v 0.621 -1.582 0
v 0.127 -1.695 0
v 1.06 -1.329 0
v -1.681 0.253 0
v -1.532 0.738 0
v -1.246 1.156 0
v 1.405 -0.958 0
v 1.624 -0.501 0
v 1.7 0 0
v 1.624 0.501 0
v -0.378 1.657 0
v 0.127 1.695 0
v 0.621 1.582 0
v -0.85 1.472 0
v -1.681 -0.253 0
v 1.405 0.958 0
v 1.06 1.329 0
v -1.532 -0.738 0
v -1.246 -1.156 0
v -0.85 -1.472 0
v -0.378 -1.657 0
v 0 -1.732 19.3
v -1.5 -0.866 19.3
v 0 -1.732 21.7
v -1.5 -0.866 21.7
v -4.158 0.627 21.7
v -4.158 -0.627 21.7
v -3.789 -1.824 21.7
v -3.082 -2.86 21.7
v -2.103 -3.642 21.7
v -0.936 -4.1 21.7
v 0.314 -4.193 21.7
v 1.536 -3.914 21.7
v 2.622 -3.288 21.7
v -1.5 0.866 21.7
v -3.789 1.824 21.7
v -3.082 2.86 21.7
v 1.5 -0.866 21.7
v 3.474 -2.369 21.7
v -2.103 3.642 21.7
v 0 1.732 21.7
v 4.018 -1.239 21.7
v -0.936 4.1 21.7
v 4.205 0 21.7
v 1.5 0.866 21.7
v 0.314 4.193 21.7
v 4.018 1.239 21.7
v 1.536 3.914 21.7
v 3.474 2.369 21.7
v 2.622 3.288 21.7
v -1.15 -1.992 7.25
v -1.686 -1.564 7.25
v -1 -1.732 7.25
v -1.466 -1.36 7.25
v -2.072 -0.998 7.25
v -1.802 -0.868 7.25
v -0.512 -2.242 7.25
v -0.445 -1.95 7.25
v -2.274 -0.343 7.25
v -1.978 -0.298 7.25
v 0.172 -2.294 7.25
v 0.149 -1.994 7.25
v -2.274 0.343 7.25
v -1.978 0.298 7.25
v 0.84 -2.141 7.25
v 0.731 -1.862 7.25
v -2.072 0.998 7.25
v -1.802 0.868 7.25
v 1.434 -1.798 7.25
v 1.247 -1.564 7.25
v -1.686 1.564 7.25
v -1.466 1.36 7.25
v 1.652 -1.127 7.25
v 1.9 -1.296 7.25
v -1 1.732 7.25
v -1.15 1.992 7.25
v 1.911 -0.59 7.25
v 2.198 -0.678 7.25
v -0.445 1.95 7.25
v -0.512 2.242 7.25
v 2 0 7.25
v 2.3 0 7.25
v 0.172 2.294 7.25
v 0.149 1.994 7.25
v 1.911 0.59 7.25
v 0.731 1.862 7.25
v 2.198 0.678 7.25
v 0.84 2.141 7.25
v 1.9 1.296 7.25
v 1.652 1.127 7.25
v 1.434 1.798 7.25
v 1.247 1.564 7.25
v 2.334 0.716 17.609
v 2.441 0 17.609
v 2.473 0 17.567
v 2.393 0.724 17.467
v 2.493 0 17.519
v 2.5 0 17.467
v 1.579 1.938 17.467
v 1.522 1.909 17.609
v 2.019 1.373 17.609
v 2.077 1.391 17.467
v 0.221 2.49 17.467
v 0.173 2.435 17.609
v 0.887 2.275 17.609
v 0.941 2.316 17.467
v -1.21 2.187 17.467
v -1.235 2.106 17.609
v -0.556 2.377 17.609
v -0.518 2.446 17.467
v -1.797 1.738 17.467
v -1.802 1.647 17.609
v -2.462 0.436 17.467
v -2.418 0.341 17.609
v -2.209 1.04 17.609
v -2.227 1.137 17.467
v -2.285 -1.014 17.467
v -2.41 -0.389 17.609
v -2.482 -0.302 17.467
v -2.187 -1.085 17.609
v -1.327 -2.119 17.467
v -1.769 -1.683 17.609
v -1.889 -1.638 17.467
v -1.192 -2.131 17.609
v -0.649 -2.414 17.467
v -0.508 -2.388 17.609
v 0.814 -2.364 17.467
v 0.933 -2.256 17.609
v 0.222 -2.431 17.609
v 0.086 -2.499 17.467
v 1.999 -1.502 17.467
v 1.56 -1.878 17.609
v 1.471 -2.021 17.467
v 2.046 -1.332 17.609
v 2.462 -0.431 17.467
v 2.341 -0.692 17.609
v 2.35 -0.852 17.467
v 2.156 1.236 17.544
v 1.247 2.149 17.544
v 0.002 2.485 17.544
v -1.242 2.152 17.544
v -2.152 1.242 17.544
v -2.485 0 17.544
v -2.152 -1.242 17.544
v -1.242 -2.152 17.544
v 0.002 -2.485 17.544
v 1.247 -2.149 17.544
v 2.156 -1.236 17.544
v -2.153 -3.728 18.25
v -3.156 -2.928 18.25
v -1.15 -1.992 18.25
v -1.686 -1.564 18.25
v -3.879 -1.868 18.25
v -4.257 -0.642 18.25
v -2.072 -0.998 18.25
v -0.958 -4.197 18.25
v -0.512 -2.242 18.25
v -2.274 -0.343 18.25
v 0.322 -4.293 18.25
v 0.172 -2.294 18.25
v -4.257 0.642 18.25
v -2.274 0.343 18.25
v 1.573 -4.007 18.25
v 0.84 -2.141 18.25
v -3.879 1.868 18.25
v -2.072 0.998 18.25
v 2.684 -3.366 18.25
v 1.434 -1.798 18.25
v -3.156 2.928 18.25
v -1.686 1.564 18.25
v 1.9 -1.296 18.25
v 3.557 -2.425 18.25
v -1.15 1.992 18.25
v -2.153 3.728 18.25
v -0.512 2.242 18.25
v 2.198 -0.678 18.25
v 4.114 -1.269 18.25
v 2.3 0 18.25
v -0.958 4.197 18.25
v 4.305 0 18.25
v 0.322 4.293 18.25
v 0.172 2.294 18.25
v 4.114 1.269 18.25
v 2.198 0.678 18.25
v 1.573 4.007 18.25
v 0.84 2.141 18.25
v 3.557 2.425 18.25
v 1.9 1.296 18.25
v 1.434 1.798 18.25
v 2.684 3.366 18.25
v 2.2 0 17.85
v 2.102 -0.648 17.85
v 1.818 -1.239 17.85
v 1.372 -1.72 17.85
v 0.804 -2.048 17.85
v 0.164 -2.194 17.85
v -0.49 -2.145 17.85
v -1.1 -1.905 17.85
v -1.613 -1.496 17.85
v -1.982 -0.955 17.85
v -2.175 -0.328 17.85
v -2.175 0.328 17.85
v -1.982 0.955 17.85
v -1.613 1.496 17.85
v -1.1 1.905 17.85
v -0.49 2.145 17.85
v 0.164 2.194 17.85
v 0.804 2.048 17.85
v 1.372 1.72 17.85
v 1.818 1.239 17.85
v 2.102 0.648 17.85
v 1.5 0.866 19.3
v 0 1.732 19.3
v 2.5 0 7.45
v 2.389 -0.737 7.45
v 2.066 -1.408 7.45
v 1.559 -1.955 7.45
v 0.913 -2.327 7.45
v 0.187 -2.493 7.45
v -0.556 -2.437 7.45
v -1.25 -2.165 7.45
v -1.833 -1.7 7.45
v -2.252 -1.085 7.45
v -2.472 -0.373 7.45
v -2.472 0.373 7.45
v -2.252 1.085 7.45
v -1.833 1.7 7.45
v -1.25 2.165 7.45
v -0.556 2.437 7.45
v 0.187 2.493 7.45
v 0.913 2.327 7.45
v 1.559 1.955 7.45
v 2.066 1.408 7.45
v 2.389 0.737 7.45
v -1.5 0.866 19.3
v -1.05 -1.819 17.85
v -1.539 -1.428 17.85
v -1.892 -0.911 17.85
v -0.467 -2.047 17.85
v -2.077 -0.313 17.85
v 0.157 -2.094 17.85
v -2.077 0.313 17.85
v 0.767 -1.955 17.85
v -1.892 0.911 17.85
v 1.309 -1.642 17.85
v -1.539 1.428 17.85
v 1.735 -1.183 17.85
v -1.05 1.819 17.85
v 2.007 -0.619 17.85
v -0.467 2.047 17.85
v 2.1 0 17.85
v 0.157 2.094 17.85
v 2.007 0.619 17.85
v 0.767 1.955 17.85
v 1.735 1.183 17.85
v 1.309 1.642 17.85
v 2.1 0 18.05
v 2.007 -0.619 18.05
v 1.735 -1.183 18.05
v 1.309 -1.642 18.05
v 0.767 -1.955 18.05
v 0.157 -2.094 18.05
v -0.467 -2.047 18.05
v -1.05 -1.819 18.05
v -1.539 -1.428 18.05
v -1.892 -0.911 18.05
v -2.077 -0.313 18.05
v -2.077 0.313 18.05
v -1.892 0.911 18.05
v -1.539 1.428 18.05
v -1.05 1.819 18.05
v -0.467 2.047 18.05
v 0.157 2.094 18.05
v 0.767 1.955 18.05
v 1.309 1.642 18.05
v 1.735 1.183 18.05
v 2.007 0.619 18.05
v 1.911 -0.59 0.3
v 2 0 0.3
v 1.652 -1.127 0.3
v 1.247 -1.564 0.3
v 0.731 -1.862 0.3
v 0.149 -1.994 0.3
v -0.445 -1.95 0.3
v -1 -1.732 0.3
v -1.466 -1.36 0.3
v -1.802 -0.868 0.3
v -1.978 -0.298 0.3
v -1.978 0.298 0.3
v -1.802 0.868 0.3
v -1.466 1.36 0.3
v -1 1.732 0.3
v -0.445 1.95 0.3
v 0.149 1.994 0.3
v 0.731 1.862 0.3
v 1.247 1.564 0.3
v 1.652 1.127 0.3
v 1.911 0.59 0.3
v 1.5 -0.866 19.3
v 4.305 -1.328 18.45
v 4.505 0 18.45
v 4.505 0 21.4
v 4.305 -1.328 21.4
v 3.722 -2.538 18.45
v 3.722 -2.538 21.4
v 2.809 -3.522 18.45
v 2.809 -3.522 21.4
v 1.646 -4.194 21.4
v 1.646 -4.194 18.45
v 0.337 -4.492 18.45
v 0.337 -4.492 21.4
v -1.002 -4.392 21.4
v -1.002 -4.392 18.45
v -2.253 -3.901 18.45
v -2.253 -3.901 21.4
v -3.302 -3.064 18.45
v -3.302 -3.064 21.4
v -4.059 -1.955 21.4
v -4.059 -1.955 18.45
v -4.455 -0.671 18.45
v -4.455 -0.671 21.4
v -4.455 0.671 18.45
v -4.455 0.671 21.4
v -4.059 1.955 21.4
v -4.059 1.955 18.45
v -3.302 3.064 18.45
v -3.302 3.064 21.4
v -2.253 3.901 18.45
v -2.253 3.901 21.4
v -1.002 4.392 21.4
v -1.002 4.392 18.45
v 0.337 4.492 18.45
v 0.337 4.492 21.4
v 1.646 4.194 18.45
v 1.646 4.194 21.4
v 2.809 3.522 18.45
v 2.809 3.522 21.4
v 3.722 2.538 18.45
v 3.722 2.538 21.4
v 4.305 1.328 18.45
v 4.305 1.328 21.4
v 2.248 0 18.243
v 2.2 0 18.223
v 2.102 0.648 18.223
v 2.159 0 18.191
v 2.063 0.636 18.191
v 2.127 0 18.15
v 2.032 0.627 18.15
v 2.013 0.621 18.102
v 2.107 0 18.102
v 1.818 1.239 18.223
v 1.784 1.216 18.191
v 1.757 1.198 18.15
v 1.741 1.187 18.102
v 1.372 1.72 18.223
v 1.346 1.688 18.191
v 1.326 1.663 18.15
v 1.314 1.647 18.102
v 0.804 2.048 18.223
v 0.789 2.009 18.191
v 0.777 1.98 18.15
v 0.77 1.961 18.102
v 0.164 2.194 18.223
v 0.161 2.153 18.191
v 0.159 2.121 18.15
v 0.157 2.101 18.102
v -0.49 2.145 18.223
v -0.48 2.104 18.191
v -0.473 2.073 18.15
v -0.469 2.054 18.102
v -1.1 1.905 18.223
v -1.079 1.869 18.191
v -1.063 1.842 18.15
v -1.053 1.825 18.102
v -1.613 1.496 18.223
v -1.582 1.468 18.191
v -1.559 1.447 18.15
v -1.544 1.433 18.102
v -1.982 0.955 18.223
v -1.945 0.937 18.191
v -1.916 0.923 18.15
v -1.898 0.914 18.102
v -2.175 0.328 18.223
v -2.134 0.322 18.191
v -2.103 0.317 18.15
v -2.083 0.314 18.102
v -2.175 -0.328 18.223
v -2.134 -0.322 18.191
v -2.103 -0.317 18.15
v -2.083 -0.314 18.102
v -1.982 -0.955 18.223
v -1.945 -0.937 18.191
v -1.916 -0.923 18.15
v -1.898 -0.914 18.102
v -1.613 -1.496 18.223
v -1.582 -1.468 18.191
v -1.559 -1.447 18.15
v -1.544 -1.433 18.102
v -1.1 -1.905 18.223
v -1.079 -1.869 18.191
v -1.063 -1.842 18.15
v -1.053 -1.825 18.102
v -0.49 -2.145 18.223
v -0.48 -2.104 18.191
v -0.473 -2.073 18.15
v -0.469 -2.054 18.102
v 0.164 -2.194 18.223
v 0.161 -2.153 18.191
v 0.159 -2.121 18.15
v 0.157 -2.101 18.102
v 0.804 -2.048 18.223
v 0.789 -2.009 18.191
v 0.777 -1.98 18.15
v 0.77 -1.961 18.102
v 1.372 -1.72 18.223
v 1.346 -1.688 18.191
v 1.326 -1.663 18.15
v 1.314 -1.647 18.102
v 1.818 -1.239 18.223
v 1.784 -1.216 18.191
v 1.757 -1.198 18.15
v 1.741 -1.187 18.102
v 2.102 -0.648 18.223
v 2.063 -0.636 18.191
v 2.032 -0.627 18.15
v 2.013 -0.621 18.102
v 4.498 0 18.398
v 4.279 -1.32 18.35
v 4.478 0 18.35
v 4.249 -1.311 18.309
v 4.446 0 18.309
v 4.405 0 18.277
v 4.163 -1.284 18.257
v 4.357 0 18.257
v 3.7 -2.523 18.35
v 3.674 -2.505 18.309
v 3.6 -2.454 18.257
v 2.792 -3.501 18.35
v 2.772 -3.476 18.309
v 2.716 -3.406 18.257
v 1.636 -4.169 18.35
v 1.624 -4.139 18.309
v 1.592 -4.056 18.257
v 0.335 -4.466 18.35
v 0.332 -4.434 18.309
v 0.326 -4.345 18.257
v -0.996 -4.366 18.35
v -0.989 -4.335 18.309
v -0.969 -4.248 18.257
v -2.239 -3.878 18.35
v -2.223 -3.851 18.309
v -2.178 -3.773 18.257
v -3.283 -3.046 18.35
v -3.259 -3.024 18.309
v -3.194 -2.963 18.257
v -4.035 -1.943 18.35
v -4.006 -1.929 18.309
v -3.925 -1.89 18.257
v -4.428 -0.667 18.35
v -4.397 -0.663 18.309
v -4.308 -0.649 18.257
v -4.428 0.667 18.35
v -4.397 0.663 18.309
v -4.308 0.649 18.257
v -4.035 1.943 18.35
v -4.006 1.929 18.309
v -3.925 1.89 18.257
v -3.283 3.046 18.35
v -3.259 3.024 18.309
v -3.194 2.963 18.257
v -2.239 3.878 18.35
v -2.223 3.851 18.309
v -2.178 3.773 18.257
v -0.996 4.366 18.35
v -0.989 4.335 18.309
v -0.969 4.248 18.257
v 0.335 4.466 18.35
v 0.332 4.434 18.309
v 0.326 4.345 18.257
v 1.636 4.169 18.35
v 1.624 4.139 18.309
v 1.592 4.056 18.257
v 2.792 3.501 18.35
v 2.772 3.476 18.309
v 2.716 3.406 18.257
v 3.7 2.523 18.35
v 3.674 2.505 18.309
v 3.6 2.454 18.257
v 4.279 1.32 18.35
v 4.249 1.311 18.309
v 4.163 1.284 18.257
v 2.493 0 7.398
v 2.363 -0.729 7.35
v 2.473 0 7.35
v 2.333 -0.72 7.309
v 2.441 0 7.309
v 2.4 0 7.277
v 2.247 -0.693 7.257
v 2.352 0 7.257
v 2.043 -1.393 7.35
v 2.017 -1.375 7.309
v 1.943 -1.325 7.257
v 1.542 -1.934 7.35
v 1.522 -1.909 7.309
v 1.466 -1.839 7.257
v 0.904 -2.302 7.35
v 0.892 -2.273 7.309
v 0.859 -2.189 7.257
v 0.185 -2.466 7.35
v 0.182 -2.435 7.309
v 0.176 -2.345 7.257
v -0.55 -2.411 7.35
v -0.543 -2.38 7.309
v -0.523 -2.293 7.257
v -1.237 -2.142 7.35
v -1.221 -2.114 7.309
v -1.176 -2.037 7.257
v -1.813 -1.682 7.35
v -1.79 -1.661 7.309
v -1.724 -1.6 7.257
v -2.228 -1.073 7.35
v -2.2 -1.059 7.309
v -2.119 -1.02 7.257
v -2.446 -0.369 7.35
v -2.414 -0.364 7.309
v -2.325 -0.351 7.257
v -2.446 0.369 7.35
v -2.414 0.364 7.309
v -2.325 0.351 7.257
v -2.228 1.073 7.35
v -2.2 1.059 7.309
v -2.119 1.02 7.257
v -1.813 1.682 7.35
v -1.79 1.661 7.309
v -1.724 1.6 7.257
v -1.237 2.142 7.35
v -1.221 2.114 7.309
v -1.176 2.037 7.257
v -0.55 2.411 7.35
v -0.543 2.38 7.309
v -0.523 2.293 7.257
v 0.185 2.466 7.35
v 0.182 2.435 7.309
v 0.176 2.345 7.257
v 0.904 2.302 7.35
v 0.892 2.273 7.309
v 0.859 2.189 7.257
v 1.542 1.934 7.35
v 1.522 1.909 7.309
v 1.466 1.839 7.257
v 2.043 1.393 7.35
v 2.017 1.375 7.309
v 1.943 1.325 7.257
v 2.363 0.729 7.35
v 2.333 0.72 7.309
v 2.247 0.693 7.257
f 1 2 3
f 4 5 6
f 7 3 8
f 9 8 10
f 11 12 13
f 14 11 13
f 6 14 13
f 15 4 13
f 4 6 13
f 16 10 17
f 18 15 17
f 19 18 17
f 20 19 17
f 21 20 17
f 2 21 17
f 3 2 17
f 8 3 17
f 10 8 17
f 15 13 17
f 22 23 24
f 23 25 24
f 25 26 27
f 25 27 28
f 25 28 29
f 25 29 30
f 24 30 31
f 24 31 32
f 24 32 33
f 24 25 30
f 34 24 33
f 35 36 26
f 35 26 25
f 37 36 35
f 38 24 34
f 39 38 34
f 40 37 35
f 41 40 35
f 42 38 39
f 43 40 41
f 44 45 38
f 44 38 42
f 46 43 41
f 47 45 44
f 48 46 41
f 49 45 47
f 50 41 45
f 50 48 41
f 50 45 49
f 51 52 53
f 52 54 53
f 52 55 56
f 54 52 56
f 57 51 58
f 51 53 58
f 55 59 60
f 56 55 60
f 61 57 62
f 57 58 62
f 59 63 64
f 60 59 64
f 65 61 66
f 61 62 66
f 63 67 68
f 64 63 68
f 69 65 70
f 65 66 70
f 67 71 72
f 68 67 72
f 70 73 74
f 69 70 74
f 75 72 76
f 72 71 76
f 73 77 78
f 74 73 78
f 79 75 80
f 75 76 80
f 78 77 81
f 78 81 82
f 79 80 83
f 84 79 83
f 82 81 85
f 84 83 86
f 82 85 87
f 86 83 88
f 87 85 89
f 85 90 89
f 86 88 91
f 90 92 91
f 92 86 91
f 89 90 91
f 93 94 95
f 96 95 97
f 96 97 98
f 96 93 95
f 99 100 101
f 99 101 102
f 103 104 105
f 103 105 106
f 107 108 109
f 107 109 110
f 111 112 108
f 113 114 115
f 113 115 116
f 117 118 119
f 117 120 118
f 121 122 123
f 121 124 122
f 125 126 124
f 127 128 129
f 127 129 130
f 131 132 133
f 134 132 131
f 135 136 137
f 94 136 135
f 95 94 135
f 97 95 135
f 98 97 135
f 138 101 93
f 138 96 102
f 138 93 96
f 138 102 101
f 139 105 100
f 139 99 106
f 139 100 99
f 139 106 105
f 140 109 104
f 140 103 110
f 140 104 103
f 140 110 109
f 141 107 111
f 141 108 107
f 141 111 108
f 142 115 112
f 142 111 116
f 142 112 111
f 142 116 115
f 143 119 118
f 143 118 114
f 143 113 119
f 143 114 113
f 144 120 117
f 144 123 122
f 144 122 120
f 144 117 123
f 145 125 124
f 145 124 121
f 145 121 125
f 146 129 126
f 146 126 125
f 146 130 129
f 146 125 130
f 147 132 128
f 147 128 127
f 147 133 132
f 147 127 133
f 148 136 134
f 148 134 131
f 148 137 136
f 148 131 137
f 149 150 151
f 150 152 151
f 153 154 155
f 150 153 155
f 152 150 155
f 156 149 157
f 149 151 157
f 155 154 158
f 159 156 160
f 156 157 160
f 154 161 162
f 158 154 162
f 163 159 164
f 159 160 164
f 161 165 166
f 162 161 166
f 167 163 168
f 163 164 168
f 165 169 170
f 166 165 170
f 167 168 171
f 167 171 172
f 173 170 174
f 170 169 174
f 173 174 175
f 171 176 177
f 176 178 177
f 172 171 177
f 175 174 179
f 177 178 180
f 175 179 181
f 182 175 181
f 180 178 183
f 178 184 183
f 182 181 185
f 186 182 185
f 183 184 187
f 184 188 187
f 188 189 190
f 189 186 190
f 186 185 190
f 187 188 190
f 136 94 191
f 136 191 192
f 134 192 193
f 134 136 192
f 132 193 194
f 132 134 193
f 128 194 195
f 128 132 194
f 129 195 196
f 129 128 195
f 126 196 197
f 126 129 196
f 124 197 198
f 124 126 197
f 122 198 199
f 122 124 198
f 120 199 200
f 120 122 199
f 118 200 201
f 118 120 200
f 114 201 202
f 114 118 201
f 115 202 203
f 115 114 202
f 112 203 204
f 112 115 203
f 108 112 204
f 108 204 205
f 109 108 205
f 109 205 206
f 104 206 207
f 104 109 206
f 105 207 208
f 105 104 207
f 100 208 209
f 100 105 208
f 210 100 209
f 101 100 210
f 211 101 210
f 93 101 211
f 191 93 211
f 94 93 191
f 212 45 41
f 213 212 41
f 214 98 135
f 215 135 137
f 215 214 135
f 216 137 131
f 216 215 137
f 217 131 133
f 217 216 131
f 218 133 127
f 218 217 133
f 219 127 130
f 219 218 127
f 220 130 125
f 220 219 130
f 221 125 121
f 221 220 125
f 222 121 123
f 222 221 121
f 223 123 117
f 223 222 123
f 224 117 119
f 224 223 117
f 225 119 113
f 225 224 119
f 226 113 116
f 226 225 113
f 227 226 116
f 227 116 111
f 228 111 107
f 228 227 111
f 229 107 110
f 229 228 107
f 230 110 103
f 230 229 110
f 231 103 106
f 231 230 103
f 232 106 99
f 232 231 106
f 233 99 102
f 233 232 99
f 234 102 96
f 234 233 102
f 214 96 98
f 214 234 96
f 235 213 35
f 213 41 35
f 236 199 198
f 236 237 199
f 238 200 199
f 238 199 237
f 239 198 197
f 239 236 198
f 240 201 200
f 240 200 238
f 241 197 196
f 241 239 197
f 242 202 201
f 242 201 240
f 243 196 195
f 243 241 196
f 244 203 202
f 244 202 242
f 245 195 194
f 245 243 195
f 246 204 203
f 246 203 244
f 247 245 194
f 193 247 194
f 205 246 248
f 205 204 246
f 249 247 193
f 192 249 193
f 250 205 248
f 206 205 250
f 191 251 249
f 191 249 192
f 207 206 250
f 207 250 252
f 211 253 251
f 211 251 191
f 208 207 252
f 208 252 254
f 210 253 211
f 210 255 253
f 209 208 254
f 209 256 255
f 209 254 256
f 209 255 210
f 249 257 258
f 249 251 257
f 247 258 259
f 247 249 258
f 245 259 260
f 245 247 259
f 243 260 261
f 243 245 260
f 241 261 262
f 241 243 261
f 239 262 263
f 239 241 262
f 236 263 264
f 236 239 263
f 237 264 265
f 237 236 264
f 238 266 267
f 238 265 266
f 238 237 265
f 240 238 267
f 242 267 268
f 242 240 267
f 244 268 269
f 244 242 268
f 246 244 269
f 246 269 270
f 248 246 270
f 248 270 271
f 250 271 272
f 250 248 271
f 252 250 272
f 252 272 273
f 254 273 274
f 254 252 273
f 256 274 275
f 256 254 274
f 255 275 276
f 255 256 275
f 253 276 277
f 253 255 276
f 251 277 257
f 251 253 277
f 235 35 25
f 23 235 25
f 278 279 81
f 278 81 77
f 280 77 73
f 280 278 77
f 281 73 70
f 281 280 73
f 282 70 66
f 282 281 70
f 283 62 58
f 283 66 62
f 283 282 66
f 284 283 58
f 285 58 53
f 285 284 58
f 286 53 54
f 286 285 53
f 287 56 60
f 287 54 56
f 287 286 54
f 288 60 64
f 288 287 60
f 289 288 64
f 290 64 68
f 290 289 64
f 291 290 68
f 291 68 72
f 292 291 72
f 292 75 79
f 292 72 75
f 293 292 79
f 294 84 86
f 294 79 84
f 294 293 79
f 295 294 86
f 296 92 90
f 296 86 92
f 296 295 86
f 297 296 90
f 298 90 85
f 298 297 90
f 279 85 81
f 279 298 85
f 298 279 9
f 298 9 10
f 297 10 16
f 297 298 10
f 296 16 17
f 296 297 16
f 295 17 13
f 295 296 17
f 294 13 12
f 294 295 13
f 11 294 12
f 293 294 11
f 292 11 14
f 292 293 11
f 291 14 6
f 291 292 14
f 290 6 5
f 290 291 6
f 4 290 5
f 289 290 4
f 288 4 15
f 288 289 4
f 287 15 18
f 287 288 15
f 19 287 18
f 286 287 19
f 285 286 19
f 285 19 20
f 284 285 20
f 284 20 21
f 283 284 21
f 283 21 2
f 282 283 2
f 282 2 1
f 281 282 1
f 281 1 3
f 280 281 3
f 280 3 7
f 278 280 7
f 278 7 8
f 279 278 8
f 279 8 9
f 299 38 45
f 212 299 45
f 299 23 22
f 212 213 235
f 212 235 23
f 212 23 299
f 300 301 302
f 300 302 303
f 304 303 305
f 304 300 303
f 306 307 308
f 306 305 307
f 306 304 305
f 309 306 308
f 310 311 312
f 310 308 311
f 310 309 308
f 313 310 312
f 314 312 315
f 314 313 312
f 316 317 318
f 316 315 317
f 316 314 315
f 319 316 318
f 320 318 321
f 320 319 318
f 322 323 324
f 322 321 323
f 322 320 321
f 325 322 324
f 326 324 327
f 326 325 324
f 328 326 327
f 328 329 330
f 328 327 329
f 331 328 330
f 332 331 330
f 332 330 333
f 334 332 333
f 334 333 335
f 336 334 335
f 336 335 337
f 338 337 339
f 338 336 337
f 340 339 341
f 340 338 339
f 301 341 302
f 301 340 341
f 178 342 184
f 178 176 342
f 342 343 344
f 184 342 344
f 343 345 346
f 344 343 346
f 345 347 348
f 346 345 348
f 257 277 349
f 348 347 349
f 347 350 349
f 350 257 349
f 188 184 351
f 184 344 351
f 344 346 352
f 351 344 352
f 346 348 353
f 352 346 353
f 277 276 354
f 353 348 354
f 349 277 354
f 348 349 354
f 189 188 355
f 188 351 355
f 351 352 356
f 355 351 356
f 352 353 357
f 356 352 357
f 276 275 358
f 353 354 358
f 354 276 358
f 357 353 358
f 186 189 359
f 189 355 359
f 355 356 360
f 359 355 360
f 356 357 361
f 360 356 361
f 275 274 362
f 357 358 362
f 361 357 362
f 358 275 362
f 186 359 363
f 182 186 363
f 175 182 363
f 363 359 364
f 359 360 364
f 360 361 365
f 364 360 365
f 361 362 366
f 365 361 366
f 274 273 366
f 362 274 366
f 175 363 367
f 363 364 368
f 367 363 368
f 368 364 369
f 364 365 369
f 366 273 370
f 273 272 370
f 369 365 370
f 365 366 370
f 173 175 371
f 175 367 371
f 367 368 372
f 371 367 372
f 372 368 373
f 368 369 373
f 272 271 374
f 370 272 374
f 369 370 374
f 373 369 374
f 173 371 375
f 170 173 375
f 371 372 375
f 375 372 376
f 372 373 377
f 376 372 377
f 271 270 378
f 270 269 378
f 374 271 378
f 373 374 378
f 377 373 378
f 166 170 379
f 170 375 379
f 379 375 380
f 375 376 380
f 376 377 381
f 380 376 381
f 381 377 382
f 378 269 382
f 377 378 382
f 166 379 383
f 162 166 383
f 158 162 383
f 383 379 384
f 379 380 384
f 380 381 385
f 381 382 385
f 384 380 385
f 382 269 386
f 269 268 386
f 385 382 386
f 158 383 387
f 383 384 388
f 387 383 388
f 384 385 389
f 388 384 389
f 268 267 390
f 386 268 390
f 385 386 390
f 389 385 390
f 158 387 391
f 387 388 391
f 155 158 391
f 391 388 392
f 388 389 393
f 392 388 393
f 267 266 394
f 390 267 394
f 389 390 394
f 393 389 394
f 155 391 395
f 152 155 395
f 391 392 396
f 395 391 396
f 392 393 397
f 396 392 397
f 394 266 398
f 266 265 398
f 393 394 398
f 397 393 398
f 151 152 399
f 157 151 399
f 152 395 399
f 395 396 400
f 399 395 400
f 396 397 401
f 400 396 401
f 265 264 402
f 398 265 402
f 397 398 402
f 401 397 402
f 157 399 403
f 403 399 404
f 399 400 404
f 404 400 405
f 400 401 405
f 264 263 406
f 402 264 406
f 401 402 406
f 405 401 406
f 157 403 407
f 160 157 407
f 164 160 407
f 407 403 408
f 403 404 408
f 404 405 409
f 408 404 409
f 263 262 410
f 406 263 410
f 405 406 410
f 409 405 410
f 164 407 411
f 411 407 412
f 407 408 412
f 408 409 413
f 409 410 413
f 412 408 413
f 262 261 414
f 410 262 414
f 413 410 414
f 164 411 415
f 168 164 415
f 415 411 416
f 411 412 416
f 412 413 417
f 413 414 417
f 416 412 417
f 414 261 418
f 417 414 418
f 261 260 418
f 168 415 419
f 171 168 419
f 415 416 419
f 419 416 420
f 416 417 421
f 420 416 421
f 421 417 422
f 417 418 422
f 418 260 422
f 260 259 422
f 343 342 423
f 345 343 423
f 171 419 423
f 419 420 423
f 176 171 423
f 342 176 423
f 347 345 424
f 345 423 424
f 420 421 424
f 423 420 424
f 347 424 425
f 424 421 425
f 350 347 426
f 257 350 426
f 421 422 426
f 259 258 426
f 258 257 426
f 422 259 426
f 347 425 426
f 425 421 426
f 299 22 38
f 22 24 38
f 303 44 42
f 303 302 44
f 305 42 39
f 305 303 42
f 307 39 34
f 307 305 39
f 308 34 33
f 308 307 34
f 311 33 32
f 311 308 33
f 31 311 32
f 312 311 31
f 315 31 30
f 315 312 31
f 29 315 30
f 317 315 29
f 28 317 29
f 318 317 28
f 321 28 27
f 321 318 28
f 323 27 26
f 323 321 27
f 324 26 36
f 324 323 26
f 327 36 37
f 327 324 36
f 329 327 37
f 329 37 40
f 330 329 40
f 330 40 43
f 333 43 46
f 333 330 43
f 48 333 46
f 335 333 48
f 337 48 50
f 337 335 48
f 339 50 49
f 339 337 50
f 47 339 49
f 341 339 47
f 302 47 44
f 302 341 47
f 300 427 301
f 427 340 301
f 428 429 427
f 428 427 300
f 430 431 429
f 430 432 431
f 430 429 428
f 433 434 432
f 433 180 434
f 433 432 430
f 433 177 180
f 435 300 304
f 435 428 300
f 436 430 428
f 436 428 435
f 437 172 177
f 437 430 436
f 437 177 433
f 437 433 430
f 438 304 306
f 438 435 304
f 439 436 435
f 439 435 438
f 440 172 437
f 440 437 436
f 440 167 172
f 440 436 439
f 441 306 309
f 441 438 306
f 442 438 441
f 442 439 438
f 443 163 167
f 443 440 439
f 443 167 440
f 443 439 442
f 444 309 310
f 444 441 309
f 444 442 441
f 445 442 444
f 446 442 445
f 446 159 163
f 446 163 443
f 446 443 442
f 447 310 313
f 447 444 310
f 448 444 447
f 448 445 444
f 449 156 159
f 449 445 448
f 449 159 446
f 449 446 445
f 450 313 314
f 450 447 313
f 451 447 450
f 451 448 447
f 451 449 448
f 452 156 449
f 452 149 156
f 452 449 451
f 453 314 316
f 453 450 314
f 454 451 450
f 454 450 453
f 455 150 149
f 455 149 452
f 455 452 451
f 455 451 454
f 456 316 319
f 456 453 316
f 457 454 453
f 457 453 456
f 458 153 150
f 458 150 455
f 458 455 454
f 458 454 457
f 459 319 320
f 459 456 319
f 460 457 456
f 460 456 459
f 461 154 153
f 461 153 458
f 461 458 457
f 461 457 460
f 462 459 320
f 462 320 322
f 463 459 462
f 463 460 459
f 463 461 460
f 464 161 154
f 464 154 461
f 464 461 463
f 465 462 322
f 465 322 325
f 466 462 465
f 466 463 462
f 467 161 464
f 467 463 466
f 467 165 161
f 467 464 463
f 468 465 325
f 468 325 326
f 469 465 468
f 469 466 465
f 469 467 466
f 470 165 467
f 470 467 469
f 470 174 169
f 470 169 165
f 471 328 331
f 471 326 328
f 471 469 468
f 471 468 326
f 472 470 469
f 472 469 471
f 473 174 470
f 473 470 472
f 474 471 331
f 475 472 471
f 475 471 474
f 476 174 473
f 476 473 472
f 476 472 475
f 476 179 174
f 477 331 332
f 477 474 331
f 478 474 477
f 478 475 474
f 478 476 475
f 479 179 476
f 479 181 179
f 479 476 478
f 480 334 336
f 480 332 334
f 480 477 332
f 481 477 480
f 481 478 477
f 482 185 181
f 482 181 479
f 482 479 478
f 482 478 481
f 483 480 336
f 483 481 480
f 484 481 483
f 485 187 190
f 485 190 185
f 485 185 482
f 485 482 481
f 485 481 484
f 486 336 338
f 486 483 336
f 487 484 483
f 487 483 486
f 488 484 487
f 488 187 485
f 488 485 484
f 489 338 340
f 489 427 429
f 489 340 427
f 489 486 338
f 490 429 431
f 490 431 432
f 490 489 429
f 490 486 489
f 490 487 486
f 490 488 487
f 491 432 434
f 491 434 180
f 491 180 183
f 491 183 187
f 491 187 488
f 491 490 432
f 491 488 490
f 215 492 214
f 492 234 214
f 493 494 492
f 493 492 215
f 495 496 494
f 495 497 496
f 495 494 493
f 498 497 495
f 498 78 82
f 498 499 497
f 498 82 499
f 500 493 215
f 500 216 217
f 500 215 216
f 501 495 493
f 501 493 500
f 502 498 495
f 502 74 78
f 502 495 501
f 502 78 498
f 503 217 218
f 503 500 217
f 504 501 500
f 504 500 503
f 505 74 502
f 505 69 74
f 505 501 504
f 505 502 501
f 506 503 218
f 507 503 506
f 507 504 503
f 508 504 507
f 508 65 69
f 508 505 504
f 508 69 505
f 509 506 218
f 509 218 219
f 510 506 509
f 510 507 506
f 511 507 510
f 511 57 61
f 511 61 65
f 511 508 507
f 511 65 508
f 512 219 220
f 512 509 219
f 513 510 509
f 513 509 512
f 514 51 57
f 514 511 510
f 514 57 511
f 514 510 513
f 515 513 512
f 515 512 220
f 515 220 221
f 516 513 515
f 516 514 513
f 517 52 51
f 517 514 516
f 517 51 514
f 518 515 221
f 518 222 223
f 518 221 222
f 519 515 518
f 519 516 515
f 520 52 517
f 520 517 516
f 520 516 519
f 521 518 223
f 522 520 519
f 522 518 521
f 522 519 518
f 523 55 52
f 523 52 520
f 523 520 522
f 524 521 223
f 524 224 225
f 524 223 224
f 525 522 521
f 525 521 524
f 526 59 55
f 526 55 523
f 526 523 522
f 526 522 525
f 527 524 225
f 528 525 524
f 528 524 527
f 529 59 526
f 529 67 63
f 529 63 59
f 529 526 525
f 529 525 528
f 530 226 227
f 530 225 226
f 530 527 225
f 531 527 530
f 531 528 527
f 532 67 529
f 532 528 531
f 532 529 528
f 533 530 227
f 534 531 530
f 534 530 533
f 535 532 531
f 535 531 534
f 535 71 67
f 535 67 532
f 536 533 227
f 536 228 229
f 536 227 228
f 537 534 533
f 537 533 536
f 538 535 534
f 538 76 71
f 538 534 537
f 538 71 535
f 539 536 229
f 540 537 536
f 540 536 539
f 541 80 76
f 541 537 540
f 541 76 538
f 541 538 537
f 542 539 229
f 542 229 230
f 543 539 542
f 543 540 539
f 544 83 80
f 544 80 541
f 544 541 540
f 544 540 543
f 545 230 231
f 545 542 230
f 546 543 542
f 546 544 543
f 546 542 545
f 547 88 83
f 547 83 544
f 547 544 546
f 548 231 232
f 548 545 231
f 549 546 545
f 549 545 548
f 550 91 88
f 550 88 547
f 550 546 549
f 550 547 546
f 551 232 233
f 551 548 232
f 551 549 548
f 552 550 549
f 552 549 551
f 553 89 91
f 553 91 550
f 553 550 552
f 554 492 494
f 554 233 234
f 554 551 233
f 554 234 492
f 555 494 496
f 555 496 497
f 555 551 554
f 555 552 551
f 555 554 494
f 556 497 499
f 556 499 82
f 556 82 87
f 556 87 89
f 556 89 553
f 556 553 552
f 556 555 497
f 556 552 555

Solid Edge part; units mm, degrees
sketch "Sketch1" plane through (0, 0, 0) normal (0, -1, 0) x (1, 0, 0)
  line L0 (0, 21.7) -> (4.505, 21.7)
  line L1 (4.505, 21.7) -> (4.505, 18.25)
  line L2 (4.505, 18.25) -> (2.1, 18.25)
  line L3 (2.1, 18.25) -> (2.1, 17.85)
  line L4 (2.1, 17.85) -> (2.5, 17.85)
  line L5 (2.5, 17.85) -> (2.5, 7.25)
  line L6 (2.5, 7.25) -> (2, 7.25)
  line L7 (2, 7.25) -> (2, 0)
  line L8 (2, 0) -> (0, 0)
  dimension "D1" = 4.505
  dimension "D2" = 3.45
  dimension "D3" = 11
  dimension "D4" = 0.4
  dimension "D5" = 7.25
  dimension "D6" = 2.5
  dimension "D7" = 2
revolve "RevolvedProtrusion1" add sketch "Sketch1" angle 360 about axis through (0, 0, 0) along (0, 0, 1)
chamfer "Chamfer1" distance 0.3 angle 45 3 edges at (-2.5, 0, 17.85) (-4.505, 0, 21.7) (-2, 0, 0)
fillet "Round_1" radius 0.2 4 edges at (-4.505, 0, 18.25) (-2.1, 0, 18.25) (-2.5, 0, 7.25) (-2.5, 0, 17.55)
sketch "Sketch2" plane through (0, 0, 21.7) normal (0, 0, 1) x (1, 0, 0)
  line L0 (1.5, 0.866) -> (0, 1.7321)
  line L1 (0, 1.7321) -> (-1.5, 0.866)
  line L2 (-1.5, 0.866) -> (-1.5, -0.866)
  line L3 (-1.5, -0.866) -> (0, -1.7321)
  line L4 (0, -1.7321) -> (1.5, -0.866)
  line L5 (1.5, -0.866) -> (1.5, 0.866)
  dimension "D1" = 3
extrude "ExtrudedCutout_1" cut sketch "Sketch2" against normal blind 2.4
properties material "Stainless Steel, 304"
